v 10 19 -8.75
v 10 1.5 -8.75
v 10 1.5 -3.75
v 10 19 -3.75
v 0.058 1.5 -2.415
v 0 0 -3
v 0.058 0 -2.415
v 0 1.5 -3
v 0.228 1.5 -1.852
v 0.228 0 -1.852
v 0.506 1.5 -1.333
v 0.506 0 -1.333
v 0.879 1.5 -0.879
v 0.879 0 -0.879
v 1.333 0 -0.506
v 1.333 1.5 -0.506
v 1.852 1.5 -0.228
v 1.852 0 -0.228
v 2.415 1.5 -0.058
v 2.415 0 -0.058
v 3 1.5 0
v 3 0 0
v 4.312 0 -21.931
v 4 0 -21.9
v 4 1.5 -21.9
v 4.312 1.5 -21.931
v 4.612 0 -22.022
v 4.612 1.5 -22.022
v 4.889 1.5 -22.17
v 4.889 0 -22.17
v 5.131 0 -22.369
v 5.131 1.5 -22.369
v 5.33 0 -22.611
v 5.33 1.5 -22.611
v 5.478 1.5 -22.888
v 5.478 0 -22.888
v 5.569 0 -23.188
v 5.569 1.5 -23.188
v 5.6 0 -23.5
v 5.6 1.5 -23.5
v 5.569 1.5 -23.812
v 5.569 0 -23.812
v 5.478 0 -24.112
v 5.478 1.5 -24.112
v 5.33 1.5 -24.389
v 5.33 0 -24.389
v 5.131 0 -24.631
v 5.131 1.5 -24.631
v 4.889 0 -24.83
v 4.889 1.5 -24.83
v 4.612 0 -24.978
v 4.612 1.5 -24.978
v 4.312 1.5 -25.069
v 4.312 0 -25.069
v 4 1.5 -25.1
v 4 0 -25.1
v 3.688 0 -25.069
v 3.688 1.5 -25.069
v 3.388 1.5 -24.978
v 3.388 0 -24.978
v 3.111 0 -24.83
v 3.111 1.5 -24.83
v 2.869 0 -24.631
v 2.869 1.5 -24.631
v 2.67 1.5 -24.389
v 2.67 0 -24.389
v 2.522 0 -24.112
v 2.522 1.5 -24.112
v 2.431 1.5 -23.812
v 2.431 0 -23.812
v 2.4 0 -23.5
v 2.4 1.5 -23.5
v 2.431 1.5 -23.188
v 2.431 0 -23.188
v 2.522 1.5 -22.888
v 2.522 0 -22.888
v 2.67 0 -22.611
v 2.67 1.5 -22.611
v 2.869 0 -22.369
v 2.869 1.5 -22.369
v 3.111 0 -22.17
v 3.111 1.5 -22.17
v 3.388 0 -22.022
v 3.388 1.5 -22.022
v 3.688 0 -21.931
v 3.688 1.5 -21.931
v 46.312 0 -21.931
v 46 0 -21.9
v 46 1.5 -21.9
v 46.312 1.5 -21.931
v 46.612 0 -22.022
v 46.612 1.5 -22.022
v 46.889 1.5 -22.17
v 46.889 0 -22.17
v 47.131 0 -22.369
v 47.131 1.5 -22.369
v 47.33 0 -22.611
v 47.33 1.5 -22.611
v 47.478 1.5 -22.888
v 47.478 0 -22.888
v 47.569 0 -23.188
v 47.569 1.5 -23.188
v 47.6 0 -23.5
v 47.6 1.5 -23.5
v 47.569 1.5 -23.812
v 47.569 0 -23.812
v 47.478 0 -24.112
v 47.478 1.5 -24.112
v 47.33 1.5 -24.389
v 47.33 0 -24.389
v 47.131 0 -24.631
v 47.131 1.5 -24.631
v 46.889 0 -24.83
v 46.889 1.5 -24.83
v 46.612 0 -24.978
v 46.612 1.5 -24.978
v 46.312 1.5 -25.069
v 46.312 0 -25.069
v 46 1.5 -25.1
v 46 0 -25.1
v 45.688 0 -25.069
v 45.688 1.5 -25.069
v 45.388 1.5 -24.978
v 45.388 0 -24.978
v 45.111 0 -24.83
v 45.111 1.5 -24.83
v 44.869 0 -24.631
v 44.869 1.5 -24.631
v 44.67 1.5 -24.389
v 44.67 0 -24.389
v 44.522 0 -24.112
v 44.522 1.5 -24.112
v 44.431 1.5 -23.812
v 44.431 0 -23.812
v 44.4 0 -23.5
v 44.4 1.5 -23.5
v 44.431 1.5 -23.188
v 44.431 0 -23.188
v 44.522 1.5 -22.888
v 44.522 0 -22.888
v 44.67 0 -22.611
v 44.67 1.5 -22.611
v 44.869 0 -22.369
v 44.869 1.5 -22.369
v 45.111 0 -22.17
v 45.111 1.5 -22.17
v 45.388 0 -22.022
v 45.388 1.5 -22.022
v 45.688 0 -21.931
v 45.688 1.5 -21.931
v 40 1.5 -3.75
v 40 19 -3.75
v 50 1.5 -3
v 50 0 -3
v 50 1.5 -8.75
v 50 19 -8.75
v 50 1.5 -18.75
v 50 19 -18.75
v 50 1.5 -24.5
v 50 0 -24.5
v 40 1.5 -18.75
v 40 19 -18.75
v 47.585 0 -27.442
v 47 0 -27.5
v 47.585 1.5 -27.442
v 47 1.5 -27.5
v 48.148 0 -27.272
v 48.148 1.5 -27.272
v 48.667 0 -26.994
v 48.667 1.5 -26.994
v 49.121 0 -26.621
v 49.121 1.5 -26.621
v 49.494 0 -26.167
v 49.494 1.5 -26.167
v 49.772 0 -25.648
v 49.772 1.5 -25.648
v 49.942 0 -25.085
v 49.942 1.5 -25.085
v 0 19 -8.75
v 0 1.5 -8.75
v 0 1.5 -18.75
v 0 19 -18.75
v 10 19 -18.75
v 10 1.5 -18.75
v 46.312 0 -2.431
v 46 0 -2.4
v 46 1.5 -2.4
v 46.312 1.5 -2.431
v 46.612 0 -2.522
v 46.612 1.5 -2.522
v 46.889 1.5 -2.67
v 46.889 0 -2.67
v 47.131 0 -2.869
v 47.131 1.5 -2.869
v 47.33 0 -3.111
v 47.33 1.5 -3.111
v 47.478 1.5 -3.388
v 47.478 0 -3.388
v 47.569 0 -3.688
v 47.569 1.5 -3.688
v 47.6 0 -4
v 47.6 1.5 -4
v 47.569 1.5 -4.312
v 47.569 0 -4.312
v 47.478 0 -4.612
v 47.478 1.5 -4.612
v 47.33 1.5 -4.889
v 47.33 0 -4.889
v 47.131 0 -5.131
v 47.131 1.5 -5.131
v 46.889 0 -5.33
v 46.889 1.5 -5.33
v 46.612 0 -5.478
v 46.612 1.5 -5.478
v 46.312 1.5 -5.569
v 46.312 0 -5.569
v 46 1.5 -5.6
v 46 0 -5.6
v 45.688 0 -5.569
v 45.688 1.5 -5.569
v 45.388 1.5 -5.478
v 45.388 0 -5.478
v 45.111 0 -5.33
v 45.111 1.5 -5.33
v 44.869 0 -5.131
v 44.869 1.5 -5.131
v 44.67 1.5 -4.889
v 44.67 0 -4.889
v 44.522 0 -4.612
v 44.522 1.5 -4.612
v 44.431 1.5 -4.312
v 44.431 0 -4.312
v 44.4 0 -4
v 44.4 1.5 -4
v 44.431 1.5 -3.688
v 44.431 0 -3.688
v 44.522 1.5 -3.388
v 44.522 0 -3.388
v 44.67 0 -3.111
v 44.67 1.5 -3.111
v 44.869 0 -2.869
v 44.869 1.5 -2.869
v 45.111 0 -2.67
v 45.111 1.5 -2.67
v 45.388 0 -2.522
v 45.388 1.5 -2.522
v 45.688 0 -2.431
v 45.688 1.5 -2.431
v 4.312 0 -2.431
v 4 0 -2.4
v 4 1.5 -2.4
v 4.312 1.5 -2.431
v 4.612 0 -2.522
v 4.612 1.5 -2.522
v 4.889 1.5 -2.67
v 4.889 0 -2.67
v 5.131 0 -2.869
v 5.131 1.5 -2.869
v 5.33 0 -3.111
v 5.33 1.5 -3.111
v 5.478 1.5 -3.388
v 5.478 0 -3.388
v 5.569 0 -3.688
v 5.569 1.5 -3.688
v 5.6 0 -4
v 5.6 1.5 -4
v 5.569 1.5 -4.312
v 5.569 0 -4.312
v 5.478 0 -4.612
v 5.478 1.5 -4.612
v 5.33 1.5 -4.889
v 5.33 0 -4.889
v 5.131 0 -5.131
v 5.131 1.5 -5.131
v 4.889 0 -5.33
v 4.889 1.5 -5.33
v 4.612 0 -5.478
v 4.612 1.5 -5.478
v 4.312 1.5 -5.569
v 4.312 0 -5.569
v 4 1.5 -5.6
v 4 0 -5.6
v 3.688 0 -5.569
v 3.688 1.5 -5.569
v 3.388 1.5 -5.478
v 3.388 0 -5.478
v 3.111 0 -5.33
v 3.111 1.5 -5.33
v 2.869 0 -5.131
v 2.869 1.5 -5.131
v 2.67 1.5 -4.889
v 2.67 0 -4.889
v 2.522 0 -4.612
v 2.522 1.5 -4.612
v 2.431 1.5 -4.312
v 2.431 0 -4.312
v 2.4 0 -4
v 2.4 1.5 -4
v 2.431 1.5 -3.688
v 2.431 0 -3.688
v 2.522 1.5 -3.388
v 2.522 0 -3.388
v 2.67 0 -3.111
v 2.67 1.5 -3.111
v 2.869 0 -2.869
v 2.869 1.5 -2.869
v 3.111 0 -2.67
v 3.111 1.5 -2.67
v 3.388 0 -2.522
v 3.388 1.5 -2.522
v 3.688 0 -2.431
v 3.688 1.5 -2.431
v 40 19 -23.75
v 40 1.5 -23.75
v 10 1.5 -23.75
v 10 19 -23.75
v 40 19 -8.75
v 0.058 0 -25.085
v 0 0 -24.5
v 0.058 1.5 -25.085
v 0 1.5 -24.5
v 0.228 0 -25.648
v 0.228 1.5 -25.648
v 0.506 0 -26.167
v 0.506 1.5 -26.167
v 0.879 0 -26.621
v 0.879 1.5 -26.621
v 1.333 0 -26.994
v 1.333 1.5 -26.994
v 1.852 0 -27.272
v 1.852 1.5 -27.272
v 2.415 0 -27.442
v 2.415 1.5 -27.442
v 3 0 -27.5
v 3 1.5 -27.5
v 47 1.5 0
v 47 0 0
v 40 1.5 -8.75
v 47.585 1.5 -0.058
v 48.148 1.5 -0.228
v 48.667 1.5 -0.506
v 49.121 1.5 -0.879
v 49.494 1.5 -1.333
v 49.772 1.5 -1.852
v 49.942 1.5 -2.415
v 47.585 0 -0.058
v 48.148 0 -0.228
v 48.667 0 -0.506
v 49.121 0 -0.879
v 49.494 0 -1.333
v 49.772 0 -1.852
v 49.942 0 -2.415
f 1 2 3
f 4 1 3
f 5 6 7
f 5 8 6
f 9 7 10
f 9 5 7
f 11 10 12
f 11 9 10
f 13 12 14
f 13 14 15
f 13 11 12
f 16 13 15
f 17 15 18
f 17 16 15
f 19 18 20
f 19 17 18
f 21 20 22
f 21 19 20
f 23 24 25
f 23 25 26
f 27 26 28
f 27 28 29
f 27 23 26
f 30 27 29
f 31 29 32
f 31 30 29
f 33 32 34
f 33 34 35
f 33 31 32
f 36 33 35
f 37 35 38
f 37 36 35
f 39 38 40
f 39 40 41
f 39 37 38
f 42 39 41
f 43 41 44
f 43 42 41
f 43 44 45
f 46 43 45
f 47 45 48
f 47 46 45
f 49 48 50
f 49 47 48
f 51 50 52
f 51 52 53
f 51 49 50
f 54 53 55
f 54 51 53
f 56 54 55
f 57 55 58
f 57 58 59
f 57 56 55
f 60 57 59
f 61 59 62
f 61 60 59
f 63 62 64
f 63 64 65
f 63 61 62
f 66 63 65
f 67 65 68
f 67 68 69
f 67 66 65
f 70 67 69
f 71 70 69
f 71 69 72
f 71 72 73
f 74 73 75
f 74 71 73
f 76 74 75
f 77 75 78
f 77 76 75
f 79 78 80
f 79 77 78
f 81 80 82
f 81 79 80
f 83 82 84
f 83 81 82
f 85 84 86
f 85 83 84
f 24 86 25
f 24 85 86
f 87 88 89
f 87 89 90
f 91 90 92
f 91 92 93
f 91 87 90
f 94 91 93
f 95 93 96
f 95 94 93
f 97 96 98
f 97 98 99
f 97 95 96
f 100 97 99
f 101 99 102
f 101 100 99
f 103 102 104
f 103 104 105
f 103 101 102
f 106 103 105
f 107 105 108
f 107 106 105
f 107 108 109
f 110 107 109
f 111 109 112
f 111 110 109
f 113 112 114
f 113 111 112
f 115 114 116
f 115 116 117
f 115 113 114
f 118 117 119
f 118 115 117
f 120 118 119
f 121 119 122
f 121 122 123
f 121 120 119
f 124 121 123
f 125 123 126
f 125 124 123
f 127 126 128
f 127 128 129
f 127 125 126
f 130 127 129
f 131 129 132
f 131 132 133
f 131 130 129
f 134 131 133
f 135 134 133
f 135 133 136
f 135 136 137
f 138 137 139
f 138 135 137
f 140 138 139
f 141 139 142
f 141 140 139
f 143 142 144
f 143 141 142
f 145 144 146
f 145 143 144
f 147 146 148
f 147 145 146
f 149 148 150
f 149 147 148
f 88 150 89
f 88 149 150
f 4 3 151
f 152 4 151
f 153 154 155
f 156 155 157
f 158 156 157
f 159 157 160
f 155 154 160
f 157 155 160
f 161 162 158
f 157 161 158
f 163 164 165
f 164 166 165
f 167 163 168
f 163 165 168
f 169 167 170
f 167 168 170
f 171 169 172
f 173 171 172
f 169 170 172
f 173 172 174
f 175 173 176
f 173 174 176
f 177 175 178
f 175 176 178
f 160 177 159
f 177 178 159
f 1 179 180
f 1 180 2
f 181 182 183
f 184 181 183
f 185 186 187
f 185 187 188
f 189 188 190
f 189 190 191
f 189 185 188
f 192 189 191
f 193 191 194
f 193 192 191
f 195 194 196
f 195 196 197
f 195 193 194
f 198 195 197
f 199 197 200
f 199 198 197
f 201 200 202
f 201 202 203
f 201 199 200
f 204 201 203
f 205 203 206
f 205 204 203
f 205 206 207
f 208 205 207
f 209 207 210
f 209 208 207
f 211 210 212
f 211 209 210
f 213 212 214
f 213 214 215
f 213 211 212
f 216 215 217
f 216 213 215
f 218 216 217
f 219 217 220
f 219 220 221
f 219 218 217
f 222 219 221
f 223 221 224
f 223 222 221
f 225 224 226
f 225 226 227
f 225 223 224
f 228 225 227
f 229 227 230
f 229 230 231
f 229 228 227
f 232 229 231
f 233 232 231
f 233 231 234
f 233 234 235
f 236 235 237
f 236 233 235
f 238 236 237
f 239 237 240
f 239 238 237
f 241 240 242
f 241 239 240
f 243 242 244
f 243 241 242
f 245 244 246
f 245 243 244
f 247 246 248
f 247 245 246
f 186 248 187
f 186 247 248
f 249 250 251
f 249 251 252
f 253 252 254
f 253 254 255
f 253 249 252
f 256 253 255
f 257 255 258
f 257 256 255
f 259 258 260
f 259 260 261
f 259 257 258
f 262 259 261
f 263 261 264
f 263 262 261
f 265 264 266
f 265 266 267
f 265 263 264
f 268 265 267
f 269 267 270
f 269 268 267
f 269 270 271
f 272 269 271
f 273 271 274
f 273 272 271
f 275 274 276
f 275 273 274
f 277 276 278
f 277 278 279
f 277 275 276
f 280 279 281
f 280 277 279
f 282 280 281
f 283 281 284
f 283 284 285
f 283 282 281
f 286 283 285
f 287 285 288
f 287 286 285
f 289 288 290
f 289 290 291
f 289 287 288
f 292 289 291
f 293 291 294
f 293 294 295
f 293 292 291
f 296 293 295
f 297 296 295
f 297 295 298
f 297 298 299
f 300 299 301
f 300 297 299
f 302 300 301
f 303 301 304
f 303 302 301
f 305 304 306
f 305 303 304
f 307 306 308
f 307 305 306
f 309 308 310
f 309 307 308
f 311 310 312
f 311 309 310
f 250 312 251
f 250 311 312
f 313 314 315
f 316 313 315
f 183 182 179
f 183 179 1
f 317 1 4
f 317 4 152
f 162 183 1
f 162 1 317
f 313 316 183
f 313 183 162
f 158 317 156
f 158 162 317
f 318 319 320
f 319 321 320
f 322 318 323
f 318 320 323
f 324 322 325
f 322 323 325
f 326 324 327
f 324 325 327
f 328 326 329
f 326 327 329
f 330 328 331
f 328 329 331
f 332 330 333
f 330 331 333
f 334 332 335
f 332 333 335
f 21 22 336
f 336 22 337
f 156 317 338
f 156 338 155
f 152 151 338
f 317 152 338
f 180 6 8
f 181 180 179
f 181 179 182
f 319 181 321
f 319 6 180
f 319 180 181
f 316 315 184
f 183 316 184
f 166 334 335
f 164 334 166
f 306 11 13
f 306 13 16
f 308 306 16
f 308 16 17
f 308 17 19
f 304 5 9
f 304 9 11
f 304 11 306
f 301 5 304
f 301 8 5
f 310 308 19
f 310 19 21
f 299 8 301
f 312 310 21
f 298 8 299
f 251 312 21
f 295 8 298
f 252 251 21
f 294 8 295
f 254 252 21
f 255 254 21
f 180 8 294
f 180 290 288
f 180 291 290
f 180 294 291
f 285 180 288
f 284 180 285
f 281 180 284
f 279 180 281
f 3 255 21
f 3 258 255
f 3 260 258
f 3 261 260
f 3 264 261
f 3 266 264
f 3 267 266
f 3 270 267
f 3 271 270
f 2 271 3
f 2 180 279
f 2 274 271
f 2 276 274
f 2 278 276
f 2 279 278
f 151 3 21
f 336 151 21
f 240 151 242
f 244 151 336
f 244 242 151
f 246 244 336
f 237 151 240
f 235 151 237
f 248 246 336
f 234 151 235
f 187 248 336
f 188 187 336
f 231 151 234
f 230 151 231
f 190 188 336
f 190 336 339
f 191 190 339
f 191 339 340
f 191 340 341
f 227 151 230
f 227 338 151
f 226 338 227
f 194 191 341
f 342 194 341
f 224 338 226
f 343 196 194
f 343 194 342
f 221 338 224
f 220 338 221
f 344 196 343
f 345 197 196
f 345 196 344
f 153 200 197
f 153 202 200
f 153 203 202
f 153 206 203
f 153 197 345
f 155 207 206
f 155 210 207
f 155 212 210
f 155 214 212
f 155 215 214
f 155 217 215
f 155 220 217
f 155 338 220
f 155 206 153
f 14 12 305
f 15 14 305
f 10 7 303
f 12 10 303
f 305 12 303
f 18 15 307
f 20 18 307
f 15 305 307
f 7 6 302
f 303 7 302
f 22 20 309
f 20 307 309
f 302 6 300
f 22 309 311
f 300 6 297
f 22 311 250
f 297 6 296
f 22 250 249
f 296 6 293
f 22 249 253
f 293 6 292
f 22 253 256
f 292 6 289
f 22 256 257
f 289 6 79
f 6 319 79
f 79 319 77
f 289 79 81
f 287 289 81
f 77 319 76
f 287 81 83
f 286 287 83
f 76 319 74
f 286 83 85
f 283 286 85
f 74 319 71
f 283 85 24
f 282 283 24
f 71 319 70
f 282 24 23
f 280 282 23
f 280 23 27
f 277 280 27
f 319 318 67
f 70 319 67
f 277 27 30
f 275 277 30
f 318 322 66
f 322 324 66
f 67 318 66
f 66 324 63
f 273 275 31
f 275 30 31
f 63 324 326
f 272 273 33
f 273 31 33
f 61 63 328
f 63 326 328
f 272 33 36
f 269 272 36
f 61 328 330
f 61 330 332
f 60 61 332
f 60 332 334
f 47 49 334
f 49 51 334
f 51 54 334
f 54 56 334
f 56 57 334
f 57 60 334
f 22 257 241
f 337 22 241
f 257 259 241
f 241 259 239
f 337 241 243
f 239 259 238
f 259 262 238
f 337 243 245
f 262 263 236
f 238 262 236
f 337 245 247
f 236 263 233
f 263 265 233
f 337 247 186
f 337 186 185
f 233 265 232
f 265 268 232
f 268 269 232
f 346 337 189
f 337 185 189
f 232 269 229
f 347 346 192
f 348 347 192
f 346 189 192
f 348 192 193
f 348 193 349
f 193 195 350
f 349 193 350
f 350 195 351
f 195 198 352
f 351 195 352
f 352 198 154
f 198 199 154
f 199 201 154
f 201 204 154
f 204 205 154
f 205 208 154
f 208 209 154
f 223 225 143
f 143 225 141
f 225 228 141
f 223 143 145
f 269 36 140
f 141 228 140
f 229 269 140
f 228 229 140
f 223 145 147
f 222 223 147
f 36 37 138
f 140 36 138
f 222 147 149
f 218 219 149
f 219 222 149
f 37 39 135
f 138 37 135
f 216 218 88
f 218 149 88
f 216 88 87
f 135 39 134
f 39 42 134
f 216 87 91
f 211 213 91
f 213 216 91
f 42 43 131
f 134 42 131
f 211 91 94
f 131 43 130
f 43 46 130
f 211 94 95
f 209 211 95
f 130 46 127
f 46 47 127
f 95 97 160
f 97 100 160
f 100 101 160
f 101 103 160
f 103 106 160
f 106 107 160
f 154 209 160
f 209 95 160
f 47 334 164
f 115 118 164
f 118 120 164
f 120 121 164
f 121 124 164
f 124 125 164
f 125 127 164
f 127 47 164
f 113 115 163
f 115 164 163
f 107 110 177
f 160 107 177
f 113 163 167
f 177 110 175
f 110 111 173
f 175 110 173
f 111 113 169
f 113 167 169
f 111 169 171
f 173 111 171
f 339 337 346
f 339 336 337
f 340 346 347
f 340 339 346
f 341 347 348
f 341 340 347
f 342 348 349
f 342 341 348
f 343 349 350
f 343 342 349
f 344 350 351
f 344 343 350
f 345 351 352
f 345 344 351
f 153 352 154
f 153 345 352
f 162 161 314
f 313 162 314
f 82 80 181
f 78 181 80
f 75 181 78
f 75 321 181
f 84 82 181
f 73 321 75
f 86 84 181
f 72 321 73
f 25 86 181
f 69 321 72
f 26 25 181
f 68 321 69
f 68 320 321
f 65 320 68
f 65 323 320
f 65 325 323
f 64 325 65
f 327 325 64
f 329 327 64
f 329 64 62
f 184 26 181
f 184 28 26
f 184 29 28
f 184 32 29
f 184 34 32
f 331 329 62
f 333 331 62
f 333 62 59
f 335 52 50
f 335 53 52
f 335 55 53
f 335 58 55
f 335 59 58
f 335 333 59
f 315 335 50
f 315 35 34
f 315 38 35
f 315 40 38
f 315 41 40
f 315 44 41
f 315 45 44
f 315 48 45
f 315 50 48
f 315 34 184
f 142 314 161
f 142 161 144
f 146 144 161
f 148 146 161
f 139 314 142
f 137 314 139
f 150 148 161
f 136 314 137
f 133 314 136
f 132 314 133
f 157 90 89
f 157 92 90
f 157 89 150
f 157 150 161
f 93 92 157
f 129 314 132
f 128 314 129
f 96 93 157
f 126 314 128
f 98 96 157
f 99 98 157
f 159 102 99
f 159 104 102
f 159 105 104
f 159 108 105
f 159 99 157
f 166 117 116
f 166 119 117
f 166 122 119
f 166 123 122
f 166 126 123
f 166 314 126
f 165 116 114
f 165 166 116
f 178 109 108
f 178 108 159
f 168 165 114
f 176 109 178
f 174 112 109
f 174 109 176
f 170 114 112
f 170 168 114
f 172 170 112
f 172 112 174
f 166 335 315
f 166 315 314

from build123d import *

# Parameters (mm, degrees)
SKETCH2_W           = 50
SKETCH2_H           = 27.5
SKETCH2_R           = 1.6
BOSS_EXTRUDE1_DEPTH = 1.5
FILLET1_R           = 3
SKETCH3_W           = 10
SKETCH3_H           = 10
BOSS_EXTRUDE2_DEPTH = 19


with BuildPart() as part:
    # Sketch2 → Boss-Extrude1 (new body)
    with BuildSketch(Plane(origin=(0, 0, 0), x_dir=(1, 0, 0), z_dir=(0, 1, 0))):
        with Locations((25, 13.75)):
            Rectangle(SKETCH2_W, SKETCH2_H)
        with Locations(Location((46, 23.5, 0), (0, 0, 270))):
            Circle(SKETCH2_R, mode=Mode.SUBTRACT)
        with Locations(Location((46, 4, 0), (0, 0, 270))):
            Circle(SKETCH2_R, mode=Mode.SUBTRACT)
        with Locations(Location((4, 23.5, 0), (0, 0, 270))):
            Circle(SKETCH2_R, mode=Mode.SUBTRACT)
        with Locations(Location((4, 4, 0), (0, 0, 270))):
            Circle(SKETCH2_R, mode=Mode.SUBTRACT)
    extrude(amount=BOSS_EXTRUDE1_DEPTH)

    # Fillet1
    fillet1_edges = [part.edges().sort_by_distance(p)[0] for p in [
        (0, 0.75, 0),
        (0, 0.75, -27.5),
        (50, 0.75, -27.5),
        (50, 0.75, 0),
    ]]
    fillet(fillet1_edges, radius=FILLET1_R)

    # Sketch3 → Boss-Extrude2 (add)
    with BuildSketch(Plane(origin=(0, 0, 0), x_dir=(1, 0, 0), z_dir=(0, 1, 0))):
        with Locations((5, 13.75)):
            Rectangle(SKETCH3_W, SKETCH3_H)
        Polygon((10, 18.75), (10, 8.75), (10, 3.75), (40, 3.75), (40, 8.75), (40, 18.75), (40, 23.75), (10, 23.75), align=None)
        with Locations((45, 13.75)):
            Rectangle(SKETCH3_W, SKETCH3_H)
    extrude(amount=BOSS_EXTRUDE2_DEPTH)


solid = part.part
